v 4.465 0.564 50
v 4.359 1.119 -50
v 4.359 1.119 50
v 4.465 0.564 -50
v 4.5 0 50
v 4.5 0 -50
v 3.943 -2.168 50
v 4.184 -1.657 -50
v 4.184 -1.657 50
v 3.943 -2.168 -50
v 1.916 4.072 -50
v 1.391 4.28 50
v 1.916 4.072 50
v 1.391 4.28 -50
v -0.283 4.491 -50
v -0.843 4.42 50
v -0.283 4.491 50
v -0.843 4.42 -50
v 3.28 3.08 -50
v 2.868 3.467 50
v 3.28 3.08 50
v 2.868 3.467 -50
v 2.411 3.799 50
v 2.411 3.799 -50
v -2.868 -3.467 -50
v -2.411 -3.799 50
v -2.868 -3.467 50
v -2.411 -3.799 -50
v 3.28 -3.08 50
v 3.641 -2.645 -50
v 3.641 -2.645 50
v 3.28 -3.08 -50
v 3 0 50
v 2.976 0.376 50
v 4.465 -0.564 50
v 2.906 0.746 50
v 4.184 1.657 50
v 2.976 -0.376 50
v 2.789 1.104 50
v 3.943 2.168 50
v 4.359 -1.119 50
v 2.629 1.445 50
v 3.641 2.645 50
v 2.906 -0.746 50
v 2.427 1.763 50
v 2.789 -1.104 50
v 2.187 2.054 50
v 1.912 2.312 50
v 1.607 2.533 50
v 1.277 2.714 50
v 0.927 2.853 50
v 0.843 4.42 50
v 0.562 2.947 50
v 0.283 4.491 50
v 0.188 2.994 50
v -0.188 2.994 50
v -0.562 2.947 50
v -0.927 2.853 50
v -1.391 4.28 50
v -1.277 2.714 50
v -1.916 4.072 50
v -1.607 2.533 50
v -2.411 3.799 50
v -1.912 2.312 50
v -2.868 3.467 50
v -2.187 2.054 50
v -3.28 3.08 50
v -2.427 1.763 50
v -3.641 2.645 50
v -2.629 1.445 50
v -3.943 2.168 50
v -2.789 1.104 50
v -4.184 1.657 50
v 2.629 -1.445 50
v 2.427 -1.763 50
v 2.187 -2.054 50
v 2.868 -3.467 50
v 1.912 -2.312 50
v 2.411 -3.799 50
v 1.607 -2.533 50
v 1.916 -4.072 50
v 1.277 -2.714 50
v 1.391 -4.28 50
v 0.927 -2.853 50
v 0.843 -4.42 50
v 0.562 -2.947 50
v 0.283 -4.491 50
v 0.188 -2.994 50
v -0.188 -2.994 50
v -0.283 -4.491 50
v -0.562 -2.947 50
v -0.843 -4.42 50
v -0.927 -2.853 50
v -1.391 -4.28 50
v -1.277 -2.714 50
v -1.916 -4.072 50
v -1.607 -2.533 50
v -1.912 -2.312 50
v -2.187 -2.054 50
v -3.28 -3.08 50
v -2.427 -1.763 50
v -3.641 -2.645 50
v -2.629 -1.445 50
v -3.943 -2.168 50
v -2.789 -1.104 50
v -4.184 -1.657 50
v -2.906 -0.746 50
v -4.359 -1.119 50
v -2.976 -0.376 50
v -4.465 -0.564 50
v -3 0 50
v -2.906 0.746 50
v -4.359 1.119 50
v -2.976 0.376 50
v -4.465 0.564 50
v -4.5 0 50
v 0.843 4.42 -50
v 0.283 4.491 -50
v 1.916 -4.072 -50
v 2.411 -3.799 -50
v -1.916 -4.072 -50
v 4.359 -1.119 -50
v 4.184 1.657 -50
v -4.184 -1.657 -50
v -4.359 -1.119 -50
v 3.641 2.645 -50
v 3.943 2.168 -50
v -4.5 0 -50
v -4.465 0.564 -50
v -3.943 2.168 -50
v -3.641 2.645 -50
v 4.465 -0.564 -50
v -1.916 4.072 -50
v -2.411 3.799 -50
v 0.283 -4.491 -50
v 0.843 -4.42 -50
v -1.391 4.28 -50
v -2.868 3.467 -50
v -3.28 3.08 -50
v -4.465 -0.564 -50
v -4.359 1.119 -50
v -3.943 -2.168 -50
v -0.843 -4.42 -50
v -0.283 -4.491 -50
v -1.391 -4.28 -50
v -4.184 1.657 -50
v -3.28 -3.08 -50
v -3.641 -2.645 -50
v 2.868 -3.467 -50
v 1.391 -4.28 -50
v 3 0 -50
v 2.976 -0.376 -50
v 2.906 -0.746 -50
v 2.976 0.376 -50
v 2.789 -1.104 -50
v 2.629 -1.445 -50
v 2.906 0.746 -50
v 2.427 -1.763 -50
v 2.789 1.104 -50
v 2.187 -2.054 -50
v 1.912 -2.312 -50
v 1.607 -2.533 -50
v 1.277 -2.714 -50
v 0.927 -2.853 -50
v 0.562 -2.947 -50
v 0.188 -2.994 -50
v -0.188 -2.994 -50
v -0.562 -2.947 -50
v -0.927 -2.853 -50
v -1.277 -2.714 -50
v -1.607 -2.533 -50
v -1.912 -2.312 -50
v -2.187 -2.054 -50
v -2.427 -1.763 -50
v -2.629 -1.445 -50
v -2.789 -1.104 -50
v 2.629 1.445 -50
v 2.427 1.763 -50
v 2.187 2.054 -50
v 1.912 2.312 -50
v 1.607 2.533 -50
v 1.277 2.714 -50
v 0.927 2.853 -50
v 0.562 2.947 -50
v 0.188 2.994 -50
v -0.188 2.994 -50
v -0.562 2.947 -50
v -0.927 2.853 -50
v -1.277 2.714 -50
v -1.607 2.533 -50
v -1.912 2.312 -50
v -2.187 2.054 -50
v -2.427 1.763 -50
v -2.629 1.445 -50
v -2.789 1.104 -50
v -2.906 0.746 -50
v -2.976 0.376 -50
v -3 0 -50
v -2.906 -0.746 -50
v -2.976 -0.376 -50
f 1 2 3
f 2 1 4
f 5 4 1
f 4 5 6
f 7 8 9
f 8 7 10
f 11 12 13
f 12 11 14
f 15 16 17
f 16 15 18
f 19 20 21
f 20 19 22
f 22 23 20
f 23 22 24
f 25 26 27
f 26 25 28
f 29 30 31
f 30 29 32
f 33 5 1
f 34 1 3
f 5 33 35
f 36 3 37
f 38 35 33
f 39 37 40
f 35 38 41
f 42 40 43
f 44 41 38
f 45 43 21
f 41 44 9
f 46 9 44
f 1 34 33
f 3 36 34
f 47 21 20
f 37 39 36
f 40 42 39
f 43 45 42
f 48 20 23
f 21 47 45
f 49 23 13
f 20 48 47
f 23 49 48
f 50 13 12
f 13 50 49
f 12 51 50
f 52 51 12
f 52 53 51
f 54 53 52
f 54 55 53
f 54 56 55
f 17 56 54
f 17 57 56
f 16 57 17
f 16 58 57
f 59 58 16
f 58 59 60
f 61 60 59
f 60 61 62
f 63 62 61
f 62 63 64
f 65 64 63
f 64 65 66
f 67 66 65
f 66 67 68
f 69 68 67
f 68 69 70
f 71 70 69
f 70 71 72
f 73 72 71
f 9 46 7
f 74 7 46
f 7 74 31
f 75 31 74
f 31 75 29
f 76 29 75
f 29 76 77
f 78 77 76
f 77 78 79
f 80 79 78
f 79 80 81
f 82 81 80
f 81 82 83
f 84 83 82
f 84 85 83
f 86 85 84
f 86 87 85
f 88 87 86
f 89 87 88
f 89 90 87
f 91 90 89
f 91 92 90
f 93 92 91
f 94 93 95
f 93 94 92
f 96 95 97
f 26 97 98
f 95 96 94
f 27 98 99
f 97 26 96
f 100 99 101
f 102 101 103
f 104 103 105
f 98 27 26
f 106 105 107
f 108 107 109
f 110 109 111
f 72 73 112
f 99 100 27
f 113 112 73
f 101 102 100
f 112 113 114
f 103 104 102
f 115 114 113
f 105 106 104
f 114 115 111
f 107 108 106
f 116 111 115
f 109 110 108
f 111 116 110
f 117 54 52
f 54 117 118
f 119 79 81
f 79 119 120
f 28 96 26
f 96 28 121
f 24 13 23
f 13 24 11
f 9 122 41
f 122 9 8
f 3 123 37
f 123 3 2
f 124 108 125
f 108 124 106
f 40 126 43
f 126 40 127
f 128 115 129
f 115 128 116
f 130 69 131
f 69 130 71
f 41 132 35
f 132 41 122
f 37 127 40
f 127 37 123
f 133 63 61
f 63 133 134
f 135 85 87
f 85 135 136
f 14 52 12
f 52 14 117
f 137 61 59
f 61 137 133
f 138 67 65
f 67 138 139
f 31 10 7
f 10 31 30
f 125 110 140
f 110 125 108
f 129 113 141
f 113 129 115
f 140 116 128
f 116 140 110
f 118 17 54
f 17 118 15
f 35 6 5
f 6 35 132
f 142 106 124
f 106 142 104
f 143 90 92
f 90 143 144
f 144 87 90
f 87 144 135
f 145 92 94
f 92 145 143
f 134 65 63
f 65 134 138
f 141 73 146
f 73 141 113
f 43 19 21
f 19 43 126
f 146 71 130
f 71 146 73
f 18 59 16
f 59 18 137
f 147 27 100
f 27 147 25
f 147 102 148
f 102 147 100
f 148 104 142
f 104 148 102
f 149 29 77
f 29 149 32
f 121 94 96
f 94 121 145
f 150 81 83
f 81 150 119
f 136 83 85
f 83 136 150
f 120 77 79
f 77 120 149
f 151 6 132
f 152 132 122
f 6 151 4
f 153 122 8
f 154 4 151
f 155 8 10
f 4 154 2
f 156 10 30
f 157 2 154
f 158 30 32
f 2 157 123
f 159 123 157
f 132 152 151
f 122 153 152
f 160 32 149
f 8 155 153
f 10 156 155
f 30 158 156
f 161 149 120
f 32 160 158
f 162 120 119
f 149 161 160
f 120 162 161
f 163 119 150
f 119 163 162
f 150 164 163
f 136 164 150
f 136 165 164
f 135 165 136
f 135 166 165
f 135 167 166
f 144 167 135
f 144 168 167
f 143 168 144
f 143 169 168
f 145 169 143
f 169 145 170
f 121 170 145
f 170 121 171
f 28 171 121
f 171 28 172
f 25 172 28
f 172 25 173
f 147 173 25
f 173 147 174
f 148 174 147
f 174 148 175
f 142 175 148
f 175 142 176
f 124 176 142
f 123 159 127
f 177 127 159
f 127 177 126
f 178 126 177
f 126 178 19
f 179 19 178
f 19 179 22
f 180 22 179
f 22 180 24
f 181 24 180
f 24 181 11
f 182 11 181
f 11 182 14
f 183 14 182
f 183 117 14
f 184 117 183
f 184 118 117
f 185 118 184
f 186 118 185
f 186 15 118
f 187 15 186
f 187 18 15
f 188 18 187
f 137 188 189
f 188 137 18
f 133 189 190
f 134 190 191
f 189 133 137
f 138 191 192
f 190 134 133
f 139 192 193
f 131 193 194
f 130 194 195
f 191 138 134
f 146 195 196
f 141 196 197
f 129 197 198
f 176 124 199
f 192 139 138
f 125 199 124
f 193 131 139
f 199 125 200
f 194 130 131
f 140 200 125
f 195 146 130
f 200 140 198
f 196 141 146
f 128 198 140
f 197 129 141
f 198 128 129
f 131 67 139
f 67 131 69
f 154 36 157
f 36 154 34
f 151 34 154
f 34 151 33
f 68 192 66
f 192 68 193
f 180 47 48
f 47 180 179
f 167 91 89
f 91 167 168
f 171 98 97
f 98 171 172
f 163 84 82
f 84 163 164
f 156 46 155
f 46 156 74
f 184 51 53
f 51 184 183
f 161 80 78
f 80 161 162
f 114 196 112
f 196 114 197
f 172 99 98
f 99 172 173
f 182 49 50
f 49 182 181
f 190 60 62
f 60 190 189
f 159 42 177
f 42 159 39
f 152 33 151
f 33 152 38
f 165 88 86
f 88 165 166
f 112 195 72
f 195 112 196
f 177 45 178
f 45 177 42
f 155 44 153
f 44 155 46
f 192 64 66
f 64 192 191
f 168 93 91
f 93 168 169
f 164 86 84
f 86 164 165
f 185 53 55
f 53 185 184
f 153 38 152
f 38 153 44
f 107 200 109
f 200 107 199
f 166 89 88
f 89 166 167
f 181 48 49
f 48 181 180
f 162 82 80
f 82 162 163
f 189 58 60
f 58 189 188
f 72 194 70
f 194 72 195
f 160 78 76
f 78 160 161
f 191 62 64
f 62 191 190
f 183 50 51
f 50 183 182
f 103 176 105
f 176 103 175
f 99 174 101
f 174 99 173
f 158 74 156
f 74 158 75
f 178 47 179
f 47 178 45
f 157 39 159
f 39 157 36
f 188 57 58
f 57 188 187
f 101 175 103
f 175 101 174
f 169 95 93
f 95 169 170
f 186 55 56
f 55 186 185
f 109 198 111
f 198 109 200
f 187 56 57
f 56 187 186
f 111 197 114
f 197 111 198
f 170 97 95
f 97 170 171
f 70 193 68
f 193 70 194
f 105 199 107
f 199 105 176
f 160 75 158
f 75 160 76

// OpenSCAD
$fn = 50;


difference() {
	union() {
		translate(v = [0, 0, -50.0000000000]) {
			cylinder(h = 100, r = 4.5000000000);
		}
	}
	union() {
		translate(v = [0, 0, -100.0000000000]) {
			cylinder(h = 200, r = 3.0000000000);
		}
	}
}
